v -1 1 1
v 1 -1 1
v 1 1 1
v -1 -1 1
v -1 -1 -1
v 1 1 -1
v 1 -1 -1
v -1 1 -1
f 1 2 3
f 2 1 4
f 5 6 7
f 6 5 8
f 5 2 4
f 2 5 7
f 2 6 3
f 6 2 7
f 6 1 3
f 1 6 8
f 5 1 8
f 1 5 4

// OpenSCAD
// file: ../../../../../../../../../../openscad/models/src/main/openscad/shapes/heart/heart.scad
module heart(height=1)
{
    rotate ([0, 0, 45])
    linear_extrude(height=height)
    flatHeart();
}

module heartThumbnail(height=1)
{	
    xyScale = 0.725;
    translate([0, -1.5, 0])
    scale([xyScale, xyScale, 1])
    heart(height);
}

module flatHeart()
{
    square(20, center = true);

    translate([10,0,0])	
    circle(10, center = true, color="red" );

    translate([0,10,0]) 
    circle(10, center = true);
}
// main file
use <../../../../../../../../../../openscad/models/src/main/openscad/shapes/heart/heart.scad>

color([1,0,1])cube([2,2,2],center=true);
